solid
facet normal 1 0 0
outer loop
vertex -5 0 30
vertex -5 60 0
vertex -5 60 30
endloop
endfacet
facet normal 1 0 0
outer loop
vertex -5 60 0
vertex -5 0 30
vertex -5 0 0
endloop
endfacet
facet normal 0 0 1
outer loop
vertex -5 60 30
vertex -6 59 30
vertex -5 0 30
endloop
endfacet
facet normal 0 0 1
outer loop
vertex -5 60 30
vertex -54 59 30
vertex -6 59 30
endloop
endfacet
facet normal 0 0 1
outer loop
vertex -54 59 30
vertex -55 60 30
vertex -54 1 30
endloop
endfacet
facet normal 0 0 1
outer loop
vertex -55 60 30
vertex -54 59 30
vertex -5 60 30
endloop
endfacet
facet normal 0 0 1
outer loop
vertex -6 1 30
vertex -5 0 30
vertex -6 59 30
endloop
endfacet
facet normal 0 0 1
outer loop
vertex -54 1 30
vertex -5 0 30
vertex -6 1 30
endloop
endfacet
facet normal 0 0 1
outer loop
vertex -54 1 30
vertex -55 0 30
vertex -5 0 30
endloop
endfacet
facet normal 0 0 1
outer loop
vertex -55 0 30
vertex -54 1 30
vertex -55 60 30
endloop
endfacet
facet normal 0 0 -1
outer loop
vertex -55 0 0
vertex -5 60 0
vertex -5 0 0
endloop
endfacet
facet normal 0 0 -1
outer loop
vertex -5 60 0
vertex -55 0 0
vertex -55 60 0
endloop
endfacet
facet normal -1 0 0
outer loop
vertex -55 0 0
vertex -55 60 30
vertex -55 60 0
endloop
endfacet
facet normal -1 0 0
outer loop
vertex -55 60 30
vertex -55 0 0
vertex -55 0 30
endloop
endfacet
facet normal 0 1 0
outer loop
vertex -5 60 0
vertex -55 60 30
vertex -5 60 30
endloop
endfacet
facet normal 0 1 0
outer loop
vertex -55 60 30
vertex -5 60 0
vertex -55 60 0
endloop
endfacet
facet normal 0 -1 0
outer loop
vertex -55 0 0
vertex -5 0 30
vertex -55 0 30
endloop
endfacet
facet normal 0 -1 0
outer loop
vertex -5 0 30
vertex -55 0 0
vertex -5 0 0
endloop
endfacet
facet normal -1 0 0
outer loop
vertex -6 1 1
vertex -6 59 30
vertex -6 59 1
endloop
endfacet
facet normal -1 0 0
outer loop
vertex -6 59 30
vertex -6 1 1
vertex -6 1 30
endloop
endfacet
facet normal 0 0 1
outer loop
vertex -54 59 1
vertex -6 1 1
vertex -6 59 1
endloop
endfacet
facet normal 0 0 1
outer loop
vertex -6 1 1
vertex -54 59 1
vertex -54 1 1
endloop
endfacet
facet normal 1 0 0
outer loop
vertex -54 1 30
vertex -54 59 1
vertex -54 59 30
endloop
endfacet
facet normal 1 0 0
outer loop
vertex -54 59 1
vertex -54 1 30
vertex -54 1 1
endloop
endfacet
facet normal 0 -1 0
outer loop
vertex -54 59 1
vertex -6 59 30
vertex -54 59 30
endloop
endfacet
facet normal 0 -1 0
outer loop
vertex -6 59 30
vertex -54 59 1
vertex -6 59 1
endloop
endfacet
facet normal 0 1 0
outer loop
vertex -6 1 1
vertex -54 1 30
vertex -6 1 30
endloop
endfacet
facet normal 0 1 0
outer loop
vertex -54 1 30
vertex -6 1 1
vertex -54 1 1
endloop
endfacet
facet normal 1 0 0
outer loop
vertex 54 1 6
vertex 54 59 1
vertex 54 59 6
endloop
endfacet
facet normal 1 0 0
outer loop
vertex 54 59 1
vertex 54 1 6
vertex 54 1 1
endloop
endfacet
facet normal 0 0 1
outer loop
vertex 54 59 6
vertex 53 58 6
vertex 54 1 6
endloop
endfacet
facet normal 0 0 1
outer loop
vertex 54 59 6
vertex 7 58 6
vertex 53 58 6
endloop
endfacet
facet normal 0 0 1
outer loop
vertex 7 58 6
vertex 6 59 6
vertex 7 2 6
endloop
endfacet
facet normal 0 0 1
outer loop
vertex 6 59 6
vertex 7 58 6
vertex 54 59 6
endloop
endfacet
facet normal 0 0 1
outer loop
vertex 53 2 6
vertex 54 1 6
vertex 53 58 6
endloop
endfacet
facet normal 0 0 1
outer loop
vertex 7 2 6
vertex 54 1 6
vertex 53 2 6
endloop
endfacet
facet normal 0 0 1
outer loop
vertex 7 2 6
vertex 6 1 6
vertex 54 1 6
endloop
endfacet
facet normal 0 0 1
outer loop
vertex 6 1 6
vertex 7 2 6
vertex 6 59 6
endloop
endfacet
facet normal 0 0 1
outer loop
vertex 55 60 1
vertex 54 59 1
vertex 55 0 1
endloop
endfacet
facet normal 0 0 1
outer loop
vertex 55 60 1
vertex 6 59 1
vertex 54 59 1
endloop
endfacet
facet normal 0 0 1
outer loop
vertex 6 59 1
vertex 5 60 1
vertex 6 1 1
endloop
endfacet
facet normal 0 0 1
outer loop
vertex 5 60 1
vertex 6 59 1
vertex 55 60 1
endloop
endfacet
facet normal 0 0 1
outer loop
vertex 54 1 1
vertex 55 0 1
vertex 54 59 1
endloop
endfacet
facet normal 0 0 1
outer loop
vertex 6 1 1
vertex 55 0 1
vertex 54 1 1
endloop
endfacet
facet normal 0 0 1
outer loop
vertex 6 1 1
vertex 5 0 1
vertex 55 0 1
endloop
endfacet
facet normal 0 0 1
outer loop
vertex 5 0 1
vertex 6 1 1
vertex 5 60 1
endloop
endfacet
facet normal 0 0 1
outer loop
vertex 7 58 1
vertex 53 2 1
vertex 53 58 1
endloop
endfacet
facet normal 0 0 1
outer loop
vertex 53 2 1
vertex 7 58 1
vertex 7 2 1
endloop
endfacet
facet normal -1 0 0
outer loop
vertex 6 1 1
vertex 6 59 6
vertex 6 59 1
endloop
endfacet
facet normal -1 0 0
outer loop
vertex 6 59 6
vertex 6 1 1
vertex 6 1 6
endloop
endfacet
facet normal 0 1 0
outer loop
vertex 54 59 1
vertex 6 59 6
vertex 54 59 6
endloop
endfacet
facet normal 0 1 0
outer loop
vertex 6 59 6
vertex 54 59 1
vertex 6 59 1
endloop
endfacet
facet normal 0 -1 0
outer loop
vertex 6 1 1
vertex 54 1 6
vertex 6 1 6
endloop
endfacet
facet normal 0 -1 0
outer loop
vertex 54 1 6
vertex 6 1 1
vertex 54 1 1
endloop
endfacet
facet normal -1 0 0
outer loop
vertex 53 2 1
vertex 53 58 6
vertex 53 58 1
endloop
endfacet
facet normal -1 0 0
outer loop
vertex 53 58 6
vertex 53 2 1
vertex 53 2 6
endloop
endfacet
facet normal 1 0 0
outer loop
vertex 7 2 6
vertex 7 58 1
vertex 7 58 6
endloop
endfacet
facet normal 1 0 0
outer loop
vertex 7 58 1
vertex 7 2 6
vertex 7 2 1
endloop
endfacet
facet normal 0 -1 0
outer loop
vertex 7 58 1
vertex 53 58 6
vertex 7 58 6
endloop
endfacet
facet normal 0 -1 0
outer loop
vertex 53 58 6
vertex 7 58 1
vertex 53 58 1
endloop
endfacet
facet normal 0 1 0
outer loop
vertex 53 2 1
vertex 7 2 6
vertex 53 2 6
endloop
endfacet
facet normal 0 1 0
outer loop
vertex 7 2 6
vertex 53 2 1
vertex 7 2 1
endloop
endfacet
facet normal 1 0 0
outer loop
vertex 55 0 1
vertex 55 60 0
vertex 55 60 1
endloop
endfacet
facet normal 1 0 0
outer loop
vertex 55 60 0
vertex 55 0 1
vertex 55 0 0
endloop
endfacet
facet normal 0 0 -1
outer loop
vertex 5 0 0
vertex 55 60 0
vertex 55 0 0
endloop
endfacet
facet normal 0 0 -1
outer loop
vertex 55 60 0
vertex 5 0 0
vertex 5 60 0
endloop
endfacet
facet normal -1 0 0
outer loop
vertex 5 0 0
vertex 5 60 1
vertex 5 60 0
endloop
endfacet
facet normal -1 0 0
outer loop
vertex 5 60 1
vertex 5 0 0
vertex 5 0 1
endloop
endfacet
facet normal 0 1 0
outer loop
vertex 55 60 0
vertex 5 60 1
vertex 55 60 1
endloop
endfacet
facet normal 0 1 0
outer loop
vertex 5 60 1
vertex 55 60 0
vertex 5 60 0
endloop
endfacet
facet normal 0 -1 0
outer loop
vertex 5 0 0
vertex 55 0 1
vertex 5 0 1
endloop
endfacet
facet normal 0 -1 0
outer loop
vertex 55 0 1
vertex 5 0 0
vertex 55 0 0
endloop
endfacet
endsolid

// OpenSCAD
// MIT License

// Copyright (c) 2018 ut8uu

// Permission is hereby granted, free of charge, to any person obtaining a copy
// of this software and associated documentation files (the "Software"), to deal
// in the Software without restriction, including without limitation the rights
// to use, copy, modify, merge, publish, distribute, sublicense, and/or sell
// copies of the Software, and to permit persons to whom the Software is
// furnished to do so, subject to the following conditions:

// The above copyright notice and this permission notice shall be included in all
// copies or substantial portions of the Software.

// THE SOFTWARE IS PROVIDED "AS IS", WITHOUT WARRANTY OF ANY KIND, EXPRESS OR
// IMPLIED, INCLUDING BUT NOT LIMITED TO THE WARRANTIES OF MERCHANTABILITY,
// FITNESS FOR A PARTICULAR PURPOSE AND NONINFRINGEMENT. IN NO EVENT SHALL THE
// AUTHORS OR COPYRIGHT HOLDERS BE LIABLE FOR ANY CLAIM, DAMAGES OR OTHER
// LIABILITY, WHETHER IN AN ACTION OF CONTRACT, TORT OR OTHERWISE, ARISING FROM,
// OUT OF OR IN CONNECTION WITH THE SOFTWARE OR THE USE OR OTHER DEALINGS IN THE
// SOFTWARE.

// global variables
// $box_w - width (x)
// $box_d - depth (y)
// $box_h - height (z)
// $box_wall_thickness - thickness of the box' wall

// set the variable below to see the box in action
box_demo = true;

if (box_demo)
{
    // Global resolution
    $fs = 0.1;  // Don't generate smaller facets than 0.1 mm
    $fa = 5;    // Don't generate larger angles than 5 degrees
    
    $box_h = 30;
    $box_w = 50;
    $box_d = 60;
    $box_wall_thickness = 1;
    
    box_main();
}

module box_main()
{
    box_walls_9D04E7778521468E8EBB86C1C622761C();
    box_lid_163028402DBA46F1A57207ED46D87103();
}

module box_lid_163028402DBA46F1A57207ED46D87103()
{
    w = $box_w;
    h = $box_h;
    d = $box_d;
    ww = $box_wall_thickness;
    h2 = 5;

    translate([5,0,0])
    {
        cube([w,d,ww]);
        difference()
        {
            translate([ww,ww,ww])
                cube ([w-ww*2, d-ww*2, h2]);
            translate([ww*2,ww*2,ww-1])
                cube([w-ww*4, d-ww*4, h2+2]);
        }
    }
}


module box_walls_9D04E7778521468E8EBB86C1C622761C()
{
    w = $box_w;
    h = $box_h;
    d = $box_d;
    ww = $box_wall_thickness;
    translate([-5-w,0,0]){
        difference()
        {
            cube([w, d, h]);
            translate([ww,ww,ww])
                cube([w-ww*2, d-ww*2, h]);
        }
    }
}
